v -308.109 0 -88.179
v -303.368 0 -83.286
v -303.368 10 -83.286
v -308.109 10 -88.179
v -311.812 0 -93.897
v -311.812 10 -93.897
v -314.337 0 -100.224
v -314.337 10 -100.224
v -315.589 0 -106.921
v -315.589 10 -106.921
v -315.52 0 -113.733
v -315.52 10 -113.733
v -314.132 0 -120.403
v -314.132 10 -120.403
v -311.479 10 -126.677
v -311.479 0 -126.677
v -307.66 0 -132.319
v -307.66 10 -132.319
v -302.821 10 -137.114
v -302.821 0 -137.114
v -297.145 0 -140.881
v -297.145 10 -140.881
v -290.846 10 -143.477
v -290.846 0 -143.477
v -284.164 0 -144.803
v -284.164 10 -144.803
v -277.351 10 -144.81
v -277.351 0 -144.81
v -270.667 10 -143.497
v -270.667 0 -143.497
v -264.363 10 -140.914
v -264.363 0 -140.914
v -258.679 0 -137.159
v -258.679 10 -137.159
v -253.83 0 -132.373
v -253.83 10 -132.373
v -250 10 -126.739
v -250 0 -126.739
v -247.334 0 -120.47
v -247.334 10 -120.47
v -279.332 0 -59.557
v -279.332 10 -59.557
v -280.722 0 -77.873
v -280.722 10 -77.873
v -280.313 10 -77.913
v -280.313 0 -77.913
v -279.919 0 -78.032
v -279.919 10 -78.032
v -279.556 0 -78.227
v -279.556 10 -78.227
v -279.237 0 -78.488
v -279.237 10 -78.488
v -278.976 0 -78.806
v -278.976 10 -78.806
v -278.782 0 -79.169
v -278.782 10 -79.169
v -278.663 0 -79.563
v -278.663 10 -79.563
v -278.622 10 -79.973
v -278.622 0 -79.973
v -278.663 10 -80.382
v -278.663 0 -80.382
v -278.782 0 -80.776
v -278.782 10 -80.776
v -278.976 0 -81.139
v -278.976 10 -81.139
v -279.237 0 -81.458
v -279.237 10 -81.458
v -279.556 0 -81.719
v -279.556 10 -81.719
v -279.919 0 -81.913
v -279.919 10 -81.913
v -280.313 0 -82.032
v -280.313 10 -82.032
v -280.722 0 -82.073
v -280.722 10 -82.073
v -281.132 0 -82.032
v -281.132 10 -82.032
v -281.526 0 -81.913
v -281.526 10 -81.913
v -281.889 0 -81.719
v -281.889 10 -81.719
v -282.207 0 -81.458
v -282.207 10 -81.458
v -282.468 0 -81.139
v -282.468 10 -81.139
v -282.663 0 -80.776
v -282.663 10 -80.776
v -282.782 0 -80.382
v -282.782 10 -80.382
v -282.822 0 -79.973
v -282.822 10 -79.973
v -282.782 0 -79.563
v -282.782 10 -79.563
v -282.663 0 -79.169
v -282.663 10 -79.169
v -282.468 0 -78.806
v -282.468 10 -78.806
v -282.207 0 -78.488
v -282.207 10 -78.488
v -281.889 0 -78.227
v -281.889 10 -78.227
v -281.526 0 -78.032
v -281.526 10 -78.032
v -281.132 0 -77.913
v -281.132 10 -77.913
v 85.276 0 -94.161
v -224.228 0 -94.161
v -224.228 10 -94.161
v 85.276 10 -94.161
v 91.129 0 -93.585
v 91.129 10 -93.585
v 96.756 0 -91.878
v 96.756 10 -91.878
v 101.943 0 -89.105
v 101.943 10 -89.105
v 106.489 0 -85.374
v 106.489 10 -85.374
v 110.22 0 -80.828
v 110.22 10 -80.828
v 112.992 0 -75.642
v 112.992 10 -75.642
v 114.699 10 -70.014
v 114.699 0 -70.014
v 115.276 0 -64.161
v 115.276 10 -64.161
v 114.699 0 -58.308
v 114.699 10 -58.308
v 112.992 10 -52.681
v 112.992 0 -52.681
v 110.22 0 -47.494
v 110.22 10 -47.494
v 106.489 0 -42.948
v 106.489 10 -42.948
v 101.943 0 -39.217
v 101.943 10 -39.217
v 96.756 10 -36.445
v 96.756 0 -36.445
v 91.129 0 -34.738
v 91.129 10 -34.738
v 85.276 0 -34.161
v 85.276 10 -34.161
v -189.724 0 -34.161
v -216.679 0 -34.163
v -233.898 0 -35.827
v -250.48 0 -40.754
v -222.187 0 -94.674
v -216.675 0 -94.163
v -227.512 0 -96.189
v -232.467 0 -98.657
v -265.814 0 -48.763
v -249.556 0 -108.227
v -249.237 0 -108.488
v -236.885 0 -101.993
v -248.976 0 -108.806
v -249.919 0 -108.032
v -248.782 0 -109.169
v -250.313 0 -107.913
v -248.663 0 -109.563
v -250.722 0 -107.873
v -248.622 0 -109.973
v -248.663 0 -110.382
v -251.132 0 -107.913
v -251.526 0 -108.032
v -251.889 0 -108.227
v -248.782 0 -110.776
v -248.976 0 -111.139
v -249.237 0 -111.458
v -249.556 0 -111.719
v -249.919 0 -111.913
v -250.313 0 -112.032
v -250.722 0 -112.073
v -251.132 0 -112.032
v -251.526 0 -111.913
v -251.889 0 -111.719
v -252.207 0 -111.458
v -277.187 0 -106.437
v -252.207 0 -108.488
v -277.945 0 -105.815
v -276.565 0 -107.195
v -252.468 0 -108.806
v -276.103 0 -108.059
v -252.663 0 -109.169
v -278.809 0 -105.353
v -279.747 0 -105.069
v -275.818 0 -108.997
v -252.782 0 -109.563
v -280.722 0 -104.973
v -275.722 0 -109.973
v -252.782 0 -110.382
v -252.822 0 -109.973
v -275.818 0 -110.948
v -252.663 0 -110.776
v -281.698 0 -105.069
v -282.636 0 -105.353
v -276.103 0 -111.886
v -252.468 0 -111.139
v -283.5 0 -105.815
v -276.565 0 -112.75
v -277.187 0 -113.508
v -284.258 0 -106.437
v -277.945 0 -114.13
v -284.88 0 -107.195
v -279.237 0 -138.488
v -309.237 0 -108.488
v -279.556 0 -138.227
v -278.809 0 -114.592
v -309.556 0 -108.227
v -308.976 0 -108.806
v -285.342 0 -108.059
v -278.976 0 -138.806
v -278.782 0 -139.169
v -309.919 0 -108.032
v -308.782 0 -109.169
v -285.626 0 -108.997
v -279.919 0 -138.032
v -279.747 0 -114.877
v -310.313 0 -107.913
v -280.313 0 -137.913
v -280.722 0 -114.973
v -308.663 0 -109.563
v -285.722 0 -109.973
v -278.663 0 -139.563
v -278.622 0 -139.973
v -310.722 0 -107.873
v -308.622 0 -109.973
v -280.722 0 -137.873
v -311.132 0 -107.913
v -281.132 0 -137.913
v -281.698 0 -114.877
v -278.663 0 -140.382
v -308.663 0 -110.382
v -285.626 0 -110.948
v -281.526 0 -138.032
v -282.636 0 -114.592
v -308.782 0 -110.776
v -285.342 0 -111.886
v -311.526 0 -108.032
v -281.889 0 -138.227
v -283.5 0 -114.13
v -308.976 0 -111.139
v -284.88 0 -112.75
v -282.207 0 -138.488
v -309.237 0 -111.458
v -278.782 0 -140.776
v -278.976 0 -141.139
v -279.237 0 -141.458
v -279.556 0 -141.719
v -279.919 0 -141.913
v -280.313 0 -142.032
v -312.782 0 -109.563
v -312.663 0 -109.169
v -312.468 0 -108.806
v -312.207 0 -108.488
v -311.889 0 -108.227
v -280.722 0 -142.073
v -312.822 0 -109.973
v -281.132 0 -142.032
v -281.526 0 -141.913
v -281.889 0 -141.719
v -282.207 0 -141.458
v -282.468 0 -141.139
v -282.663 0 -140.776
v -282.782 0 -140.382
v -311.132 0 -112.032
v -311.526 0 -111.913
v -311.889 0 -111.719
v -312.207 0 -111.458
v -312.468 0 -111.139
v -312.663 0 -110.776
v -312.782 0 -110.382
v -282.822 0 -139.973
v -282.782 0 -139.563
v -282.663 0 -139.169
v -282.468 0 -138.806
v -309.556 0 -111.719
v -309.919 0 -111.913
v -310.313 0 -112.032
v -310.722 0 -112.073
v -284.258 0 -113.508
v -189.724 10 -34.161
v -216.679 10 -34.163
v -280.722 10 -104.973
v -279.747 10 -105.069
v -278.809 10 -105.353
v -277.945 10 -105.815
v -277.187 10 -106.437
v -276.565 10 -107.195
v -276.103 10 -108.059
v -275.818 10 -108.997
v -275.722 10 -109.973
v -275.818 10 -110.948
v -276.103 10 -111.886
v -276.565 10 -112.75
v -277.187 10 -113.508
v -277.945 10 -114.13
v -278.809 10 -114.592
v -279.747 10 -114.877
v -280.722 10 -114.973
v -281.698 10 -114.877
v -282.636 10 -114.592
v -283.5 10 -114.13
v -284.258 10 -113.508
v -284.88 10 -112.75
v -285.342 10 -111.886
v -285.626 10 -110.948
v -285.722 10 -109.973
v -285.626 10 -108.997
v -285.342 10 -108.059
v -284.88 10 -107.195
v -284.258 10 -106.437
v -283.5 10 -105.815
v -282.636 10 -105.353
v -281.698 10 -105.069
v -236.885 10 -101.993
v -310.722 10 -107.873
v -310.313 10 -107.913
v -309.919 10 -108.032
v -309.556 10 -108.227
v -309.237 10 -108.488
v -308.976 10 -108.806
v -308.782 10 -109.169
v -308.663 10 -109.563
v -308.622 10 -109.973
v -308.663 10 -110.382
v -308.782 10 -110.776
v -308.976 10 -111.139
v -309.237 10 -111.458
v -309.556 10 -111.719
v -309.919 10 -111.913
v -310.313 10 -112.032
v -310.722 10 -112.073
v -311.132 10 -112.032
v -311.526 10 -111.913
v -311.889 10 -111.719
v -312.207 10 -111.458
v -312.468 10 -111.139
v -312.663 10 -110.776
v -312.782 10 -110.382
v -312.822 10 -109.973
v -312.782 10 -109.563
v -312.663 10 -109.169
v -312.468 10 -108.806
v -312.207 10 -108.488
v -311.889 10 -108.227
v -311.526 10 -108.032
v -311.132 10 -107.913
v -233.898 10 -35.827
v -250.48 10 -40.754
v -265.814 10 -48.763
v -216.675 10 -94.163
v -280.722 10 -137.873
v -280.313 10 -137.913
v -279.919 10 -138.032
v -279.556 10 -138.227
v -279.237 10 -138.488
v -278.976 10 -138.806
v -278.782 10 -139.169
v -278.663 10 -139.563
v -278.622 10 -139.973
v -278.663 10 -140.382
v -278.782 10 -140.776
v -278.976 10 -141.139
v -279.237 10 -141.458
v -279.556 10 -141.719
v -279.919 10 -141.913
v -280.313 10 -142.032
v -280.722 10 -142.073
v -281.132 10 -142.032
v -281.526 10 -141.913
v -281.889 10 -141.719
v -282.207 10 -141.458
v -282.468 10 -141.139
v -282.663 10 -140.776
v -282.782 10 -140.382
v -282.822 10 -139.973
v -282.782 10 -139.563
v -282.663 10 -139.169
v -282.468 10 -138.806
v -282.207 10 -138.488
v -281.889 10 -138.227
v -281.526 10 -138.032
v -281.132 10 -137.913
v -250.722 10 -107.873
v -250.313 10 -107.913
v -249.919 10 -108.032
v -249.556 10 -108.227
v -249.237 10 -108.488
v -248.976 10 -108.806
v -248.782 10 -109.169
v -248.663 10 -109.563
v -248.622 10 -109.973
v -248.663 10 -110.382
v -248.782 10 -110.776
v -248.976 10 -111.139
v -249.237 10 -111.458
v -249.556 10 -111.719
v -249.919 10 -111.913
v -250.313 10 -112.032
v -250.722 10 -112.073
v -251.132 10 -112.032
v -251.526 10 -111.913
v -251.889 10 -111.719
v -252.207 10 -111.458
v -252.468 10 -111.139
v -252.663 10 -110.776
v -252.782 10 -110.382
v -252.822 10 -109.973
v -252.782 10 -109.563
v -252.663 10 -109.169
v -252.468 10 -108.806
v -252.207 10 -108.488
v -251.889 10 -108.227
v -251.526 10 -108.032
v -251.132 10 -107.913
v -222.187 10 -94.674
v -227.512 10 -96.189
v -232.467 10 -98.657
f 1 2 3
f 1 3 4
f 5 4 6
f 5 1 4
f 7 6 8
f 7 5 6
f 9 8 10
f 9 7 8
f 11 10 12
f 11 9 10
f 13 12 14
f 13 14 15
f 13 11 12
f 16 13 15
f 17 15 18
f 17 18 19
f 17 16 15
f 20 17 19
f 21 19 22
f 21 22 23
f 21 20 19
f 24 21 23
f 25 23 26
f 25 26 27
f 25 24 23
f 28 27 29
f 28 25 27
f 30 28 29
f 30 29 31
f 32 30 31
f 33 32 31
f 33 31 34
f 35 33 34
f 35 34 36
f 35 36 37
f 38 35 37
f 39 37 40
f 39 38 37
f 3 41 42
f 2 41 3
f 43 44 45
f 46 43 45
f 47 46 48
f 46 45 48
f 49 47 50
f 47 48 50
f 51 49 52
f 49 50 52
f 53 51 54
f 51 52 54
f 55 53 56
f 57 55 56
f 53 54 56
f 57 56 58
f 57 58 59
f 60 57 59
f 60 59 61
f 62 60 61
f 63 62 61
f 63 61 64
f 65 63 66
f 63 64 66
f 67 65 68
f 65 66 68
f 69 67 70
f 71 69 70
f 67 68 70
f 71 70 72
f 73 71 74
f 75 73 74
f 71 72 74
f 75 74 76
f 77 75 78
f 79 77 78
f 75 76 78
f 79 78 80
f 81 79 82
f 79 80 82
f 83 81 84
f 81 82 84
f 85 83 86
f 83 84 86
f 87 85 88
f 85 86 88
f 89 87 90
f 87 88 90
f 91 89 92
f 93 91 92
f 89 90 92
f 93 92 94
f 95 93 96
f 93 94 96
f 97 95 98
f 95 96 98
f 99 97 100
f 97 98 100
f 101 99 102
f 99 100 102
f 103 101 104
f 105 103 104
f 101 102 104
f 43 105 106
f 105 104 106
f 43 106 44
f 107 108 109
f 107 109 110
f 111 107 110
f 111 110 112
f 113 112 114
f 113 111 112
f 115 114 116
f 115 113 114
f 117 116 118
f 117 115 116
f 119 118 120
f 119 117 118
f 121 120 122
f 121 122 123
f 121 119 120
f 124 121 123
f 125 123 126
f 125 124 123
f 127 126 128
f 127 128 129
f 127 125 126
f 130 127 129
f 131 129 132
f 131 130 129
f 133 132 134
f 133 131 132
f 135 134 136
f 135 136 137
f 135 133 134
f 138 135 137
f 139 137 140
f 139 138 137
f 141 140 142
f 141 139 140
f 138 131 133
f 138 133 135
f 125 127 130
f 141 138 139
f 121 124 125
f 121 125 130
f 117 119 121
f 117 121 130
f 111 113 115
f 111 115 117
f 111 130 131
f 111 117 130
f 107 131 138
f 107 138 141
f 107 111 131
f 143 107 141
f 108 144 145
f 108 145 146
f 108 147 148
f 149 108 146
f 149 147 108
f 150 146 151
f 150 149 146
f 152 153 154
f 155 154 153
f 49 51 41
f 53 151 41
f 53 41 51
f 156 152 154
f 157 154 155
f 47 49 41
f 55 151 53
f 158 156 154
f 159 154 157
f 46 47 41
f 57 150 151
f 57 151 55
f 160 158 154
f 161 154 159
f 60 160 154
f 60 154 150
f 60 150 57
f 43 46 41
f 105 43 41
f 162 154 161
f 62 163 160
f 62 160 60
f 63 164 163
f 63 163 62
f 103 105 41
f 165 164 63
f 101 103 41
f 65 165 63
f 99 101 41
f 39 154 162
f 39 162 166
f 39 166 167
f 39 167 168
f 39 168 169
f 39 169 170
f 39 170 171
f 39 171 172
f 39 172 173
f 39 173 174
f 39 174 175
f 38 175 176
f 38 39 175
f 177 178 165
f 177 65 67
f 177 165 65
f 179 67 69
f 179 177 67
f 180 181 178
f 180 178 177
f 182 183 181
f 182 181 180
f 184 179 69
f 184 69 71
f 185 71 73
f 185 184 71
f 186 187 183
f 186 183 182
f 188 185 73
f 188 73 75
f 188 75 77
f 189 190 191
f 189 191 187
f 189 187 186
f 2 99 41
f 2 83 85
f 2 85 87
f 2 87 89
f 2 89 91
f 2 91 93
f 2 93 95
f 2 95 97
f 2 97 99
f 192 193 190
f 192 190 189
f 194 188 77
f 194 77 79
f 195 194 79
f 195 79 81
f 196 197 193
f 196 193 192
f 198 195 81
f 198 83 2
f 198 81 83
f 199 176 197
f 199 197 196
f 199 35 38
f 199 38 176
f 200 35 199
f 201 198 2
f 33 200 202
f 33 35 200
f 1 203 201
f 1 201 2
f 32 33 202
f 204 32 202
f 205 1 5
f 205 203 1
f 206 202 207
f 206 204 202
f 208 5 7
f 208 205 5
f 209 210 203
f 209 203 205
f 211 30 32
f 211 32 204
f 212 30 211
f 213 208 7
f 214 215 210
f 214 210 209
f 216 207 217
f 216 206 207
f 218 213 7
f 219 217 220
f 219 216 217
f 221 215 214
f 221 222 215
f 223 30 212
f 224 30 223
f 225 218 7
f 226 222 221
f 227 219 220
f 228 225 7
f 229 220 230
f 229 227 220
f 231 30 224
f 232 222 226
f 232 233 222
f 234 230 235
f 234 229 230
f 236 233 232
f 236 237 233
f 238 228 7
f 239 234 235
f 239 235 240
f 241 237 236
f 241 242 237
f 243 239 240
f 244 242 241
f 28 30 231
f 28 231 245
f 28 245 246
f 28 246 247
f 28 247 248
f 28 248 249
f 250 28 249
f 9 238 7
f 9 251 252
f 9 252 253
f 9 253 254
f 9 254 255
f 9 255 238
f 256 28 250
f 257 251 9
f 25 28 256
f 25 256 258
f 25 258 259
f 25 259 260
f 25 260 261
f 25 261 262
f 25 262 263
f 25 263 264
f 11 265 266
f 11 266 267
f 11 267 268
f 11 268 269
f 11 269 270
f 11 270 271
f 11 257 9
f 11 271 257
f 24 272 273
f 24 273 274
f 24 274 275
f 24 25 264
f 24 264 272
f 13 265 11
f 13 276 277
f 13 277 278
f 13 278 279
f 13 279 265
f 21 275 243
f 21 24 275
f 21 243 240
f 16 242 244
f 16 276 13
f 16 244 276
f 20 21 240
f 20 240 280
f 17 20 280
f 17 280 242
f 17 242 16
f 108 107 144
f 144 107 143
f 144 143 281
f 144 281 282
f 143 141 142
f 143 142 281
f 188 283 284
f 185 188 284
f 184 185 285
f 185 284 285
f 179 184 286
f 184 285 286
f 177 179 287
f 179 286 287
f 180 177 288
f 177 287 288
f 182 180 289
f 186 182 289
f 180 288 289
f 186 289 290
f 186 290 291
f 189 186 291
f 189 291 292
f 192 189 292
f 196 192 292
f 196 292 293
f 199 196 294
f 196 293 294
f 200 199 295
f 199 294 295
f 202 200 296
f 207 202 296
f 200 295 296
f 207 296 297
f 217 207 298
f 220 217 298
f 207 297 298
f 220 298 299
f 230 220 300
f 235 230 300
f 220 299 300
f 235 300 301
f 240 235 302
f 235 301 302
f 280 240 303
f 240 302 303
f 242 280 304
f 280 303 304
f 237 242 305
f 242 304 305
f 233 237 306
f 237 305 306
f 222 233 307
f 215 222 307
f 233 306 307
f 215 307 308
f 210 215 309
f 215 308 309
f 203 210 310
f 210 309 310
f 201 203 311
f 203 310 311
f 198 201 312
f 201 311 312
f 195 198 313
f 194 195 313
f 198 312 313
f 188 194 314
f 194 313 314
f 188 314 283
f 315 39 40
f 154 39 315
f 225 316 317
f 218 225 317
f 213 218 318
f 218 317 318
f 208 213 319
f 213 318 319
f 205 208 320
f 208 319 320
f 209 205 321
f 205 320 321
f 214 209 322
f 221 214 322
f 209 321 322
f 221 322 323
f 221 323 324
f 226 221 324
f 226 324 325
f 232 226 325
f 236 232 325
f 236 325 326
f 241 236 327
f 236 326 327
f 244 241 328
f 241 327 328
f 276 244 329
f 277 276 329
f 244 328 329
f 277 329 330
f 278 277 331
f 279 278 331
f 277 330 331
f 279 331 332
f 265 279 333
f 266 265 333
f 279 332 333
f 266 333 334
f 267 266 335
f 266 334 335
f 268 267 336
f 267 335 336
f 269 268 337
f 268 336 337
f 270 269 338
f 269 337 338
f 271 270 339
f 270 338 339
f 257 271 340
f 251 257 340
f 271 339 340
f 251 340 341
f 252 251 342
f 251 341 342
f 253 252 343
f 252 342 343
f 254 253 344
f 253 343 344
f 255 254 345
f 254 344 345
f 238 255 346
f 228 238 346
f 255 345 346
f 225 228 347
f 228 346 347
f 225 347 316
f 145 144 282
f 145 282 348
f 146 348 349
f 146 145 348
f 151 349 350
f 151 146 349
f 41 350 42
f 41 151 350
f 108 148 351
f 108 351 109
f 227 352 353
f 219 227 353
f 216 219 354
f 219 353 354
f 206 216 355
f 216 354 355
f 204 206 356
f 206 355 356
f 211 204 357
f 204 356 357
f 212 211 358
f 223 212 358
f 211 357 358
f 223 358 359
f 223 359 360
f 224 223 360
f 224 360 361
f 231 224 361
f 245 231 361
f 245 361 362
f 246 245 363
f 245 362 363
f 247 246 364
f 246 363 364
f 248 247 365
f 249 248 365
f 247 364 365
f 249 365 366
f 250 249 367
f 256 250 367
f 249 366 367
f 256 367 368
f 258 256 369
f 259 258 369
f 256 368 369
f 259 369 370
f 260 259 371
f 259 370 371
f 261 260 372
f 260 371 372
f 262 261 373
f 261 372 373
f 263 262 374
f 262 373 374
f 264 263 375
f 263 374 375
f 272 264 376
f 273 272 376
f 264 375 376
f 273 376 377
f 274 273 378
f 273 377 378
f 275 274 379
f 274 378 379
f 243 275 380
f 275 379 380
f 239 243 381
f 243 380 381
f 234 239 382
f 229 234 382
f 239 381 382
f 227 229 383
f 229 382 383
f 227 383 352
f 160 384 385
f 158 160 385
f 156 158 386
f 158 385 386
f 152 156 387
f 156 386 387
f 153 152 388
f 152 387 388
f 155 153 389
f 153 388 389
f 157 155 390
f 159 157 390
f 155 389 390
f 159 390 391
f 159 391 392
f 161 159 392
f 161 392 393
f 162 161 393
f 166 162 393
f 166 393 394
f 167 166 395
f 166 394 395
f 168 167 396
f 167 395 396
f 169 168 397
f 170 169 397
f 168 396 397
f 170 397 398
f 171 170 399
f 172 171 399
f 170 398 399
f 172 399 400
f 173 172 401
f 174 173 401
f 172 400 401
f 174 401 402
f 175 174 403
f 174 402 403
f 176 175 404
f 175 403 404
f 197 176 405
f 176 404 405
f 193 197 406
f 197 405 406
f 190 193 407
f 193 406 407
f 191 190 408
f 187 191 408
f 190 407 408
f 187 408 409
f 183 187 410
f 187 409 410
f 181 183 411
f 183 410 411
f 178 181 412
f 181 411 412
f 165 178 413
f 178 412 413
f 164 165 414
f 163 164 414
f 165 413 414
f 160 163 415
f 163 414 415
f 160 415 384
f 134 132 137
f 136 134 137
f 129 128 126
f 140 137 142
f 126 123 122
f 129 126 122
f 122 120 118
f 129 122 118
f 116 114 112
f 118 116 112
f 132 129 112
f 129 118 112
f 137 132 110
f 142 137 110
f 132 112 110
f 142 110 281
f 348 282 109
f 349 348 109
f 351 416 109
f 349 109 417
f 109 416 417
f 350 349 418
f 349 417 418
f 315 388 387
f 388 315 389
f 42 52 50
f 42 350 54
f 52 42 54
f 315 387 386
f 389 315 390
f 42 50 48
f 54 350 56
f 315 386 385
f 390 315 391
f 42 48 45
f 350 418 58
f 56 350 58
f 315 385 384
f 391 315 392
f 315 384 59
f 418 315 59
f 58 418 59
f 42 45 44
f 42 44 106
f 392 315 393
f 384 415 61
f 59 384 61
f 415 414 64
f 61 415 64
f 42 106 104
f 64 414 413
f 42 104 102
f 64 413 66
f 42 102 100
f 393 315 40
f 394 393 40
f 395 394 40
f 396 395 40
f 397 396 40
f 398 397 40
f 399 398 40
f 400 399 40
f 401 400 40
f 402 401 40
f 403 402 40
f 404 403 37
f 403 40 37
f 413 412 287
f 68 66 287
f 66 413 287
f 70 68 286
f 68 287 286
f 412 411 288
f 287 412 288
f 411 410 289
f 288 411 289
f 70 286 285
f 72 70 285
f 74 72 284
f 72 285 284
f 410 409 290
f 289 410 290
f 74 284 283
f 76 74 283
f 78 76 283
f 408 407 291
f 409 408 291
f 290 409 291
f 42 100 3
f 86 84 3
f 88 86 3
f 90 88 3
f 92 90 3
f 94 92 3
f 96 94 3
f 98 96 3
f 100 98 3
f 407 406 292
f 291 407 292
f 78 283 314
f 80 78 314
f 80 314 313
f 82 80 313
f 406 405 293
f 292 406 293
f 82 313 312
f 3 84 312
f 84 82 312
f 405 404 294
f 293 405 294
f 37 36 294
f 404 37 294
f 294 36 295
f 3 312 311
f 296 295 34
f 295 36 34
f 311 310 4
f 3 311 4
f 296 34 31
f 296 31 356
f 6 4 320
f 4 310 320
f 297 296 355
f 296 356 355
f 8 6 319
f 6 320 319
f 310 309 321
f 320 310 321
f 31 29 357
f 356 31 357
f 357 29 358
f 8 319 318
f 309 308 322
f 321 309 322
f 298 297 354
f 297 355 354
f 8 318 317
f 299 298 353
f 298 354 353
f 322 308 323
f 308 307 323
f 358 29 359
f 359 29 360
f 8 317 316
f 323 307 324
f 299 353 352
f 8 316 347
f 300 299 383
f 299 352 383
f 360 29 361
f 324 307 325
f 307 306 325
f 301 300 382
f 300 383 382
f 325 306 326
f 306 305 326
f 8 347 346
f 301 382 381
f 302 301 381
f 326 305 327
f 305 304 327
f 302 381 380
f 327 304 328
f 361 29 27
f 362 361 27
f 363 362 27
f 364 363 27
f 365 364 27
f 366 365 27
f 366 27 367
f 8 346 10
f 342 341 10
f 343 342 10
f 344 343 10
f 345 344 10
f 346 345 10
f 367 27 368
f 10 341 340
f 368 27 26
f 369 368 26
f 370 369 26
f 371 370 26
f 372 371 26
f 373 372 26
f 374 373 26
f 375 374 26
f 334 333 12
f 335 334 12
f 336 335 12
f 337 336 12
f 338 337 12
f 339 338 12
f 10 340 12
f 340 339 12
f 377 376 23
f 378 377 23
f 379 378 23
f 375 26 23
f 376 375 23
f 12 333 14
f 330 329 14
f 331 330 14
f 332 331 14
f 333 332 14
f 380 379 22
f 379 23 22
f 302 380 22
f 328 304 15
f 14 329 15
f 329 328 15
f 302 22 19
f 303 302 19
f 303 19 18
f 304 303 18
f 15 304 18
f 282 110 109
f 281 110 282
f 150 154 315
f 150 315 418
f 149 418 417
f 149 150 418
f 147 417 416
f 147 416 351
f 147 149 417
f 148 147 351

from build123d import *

# Parameters (mm, degrees)
BOSS_EXTRUDE1_DEPTH = 10
SKETCH3_R           = 5
SKETCH3_R_2         = 2.1
CUT_EXTRUDE1_DEPTH  = 10


with BuildPart() as part:
    # Sketch2 → Boss-Extrude1 (new body)
    with BuildSketch(Plane(origin=(0, 0, 0), x_dir=(1, 0, 0), z_dir=(0, 1, 0))):
        with BuildLine():
            Line((-224.228087349, 94.161183877), (85.275800554, 94.161183877))
            ThreePointArc((85.275800554, 94.161183877), (115.275800554, 64.161183877), (85.275800554, 34.161183877))
            Line((85.275800554, 34.161183877), (-189.724199446, 34.161183877))
            Line((-189.724199446, 34.161183877), (-216.678540206, 34.162870649))
            ThreePointArc((-216.678540206, 34.162870649), (-250.480097378, 40.753794505), (-279.331674578, 59.557305814))
            Line((-279.331674578, 59.557305814), (-303.368494474, 83.28636858))
            ThreePointArc((-303.368494474, 83.28636858), (-300.074671731, 139.135756578), (-247.333786879, 120.470214177))
            Line((-247.333786879, 120.470214177), (-236.884563066, 101.993319193))
            ThreePointArc((-236.884563066, 101.993319193), (-227.511529016, 96.189234726), (-216.67478541, 94.162870531))
            Line((-216.67478541, 94.162870531), (-224.228087349, 94.161183877))
        make_face()
    extrude(amount=BOSS_EXTRUDE1_DEPTH)

    # Sketch3 → Cut-Extrude1 (cut)
    with BuildSketch(Plane(origin=(0, 10, 0), x_dir=(1, 0, 0), z_dir=(0, 1, 0))):
        with Locations(Location((-280.722408111, 109.972596722, 0), (0, 0, 270))):
            Circle(SKETCH3_R)
        with Locations(Location((-280.722408111, 139.972596722, 0), (0, 0, 270))):
            Circle(SKETCH3_R_2)
        with Locations(Location((-310.722408111, 109.972596722, 0), (0, 0, 270))):
            Circle(SKETCH3_R_2)
        with Locations(Location((-280.722408111, 79.972596722, 0), (0, 0, 270))):
            Circle(SKETCH3_R_2)
        with Locations(Location((-250.722408111, 109.972596722, 0), (0, 0, 270))):
            Circle(SKETCH3_R_2)
    extrude(amount=-CUT_EXTRUDE1_DEPTH, mode=Mode.SUBTRACT)


solid = part.part
